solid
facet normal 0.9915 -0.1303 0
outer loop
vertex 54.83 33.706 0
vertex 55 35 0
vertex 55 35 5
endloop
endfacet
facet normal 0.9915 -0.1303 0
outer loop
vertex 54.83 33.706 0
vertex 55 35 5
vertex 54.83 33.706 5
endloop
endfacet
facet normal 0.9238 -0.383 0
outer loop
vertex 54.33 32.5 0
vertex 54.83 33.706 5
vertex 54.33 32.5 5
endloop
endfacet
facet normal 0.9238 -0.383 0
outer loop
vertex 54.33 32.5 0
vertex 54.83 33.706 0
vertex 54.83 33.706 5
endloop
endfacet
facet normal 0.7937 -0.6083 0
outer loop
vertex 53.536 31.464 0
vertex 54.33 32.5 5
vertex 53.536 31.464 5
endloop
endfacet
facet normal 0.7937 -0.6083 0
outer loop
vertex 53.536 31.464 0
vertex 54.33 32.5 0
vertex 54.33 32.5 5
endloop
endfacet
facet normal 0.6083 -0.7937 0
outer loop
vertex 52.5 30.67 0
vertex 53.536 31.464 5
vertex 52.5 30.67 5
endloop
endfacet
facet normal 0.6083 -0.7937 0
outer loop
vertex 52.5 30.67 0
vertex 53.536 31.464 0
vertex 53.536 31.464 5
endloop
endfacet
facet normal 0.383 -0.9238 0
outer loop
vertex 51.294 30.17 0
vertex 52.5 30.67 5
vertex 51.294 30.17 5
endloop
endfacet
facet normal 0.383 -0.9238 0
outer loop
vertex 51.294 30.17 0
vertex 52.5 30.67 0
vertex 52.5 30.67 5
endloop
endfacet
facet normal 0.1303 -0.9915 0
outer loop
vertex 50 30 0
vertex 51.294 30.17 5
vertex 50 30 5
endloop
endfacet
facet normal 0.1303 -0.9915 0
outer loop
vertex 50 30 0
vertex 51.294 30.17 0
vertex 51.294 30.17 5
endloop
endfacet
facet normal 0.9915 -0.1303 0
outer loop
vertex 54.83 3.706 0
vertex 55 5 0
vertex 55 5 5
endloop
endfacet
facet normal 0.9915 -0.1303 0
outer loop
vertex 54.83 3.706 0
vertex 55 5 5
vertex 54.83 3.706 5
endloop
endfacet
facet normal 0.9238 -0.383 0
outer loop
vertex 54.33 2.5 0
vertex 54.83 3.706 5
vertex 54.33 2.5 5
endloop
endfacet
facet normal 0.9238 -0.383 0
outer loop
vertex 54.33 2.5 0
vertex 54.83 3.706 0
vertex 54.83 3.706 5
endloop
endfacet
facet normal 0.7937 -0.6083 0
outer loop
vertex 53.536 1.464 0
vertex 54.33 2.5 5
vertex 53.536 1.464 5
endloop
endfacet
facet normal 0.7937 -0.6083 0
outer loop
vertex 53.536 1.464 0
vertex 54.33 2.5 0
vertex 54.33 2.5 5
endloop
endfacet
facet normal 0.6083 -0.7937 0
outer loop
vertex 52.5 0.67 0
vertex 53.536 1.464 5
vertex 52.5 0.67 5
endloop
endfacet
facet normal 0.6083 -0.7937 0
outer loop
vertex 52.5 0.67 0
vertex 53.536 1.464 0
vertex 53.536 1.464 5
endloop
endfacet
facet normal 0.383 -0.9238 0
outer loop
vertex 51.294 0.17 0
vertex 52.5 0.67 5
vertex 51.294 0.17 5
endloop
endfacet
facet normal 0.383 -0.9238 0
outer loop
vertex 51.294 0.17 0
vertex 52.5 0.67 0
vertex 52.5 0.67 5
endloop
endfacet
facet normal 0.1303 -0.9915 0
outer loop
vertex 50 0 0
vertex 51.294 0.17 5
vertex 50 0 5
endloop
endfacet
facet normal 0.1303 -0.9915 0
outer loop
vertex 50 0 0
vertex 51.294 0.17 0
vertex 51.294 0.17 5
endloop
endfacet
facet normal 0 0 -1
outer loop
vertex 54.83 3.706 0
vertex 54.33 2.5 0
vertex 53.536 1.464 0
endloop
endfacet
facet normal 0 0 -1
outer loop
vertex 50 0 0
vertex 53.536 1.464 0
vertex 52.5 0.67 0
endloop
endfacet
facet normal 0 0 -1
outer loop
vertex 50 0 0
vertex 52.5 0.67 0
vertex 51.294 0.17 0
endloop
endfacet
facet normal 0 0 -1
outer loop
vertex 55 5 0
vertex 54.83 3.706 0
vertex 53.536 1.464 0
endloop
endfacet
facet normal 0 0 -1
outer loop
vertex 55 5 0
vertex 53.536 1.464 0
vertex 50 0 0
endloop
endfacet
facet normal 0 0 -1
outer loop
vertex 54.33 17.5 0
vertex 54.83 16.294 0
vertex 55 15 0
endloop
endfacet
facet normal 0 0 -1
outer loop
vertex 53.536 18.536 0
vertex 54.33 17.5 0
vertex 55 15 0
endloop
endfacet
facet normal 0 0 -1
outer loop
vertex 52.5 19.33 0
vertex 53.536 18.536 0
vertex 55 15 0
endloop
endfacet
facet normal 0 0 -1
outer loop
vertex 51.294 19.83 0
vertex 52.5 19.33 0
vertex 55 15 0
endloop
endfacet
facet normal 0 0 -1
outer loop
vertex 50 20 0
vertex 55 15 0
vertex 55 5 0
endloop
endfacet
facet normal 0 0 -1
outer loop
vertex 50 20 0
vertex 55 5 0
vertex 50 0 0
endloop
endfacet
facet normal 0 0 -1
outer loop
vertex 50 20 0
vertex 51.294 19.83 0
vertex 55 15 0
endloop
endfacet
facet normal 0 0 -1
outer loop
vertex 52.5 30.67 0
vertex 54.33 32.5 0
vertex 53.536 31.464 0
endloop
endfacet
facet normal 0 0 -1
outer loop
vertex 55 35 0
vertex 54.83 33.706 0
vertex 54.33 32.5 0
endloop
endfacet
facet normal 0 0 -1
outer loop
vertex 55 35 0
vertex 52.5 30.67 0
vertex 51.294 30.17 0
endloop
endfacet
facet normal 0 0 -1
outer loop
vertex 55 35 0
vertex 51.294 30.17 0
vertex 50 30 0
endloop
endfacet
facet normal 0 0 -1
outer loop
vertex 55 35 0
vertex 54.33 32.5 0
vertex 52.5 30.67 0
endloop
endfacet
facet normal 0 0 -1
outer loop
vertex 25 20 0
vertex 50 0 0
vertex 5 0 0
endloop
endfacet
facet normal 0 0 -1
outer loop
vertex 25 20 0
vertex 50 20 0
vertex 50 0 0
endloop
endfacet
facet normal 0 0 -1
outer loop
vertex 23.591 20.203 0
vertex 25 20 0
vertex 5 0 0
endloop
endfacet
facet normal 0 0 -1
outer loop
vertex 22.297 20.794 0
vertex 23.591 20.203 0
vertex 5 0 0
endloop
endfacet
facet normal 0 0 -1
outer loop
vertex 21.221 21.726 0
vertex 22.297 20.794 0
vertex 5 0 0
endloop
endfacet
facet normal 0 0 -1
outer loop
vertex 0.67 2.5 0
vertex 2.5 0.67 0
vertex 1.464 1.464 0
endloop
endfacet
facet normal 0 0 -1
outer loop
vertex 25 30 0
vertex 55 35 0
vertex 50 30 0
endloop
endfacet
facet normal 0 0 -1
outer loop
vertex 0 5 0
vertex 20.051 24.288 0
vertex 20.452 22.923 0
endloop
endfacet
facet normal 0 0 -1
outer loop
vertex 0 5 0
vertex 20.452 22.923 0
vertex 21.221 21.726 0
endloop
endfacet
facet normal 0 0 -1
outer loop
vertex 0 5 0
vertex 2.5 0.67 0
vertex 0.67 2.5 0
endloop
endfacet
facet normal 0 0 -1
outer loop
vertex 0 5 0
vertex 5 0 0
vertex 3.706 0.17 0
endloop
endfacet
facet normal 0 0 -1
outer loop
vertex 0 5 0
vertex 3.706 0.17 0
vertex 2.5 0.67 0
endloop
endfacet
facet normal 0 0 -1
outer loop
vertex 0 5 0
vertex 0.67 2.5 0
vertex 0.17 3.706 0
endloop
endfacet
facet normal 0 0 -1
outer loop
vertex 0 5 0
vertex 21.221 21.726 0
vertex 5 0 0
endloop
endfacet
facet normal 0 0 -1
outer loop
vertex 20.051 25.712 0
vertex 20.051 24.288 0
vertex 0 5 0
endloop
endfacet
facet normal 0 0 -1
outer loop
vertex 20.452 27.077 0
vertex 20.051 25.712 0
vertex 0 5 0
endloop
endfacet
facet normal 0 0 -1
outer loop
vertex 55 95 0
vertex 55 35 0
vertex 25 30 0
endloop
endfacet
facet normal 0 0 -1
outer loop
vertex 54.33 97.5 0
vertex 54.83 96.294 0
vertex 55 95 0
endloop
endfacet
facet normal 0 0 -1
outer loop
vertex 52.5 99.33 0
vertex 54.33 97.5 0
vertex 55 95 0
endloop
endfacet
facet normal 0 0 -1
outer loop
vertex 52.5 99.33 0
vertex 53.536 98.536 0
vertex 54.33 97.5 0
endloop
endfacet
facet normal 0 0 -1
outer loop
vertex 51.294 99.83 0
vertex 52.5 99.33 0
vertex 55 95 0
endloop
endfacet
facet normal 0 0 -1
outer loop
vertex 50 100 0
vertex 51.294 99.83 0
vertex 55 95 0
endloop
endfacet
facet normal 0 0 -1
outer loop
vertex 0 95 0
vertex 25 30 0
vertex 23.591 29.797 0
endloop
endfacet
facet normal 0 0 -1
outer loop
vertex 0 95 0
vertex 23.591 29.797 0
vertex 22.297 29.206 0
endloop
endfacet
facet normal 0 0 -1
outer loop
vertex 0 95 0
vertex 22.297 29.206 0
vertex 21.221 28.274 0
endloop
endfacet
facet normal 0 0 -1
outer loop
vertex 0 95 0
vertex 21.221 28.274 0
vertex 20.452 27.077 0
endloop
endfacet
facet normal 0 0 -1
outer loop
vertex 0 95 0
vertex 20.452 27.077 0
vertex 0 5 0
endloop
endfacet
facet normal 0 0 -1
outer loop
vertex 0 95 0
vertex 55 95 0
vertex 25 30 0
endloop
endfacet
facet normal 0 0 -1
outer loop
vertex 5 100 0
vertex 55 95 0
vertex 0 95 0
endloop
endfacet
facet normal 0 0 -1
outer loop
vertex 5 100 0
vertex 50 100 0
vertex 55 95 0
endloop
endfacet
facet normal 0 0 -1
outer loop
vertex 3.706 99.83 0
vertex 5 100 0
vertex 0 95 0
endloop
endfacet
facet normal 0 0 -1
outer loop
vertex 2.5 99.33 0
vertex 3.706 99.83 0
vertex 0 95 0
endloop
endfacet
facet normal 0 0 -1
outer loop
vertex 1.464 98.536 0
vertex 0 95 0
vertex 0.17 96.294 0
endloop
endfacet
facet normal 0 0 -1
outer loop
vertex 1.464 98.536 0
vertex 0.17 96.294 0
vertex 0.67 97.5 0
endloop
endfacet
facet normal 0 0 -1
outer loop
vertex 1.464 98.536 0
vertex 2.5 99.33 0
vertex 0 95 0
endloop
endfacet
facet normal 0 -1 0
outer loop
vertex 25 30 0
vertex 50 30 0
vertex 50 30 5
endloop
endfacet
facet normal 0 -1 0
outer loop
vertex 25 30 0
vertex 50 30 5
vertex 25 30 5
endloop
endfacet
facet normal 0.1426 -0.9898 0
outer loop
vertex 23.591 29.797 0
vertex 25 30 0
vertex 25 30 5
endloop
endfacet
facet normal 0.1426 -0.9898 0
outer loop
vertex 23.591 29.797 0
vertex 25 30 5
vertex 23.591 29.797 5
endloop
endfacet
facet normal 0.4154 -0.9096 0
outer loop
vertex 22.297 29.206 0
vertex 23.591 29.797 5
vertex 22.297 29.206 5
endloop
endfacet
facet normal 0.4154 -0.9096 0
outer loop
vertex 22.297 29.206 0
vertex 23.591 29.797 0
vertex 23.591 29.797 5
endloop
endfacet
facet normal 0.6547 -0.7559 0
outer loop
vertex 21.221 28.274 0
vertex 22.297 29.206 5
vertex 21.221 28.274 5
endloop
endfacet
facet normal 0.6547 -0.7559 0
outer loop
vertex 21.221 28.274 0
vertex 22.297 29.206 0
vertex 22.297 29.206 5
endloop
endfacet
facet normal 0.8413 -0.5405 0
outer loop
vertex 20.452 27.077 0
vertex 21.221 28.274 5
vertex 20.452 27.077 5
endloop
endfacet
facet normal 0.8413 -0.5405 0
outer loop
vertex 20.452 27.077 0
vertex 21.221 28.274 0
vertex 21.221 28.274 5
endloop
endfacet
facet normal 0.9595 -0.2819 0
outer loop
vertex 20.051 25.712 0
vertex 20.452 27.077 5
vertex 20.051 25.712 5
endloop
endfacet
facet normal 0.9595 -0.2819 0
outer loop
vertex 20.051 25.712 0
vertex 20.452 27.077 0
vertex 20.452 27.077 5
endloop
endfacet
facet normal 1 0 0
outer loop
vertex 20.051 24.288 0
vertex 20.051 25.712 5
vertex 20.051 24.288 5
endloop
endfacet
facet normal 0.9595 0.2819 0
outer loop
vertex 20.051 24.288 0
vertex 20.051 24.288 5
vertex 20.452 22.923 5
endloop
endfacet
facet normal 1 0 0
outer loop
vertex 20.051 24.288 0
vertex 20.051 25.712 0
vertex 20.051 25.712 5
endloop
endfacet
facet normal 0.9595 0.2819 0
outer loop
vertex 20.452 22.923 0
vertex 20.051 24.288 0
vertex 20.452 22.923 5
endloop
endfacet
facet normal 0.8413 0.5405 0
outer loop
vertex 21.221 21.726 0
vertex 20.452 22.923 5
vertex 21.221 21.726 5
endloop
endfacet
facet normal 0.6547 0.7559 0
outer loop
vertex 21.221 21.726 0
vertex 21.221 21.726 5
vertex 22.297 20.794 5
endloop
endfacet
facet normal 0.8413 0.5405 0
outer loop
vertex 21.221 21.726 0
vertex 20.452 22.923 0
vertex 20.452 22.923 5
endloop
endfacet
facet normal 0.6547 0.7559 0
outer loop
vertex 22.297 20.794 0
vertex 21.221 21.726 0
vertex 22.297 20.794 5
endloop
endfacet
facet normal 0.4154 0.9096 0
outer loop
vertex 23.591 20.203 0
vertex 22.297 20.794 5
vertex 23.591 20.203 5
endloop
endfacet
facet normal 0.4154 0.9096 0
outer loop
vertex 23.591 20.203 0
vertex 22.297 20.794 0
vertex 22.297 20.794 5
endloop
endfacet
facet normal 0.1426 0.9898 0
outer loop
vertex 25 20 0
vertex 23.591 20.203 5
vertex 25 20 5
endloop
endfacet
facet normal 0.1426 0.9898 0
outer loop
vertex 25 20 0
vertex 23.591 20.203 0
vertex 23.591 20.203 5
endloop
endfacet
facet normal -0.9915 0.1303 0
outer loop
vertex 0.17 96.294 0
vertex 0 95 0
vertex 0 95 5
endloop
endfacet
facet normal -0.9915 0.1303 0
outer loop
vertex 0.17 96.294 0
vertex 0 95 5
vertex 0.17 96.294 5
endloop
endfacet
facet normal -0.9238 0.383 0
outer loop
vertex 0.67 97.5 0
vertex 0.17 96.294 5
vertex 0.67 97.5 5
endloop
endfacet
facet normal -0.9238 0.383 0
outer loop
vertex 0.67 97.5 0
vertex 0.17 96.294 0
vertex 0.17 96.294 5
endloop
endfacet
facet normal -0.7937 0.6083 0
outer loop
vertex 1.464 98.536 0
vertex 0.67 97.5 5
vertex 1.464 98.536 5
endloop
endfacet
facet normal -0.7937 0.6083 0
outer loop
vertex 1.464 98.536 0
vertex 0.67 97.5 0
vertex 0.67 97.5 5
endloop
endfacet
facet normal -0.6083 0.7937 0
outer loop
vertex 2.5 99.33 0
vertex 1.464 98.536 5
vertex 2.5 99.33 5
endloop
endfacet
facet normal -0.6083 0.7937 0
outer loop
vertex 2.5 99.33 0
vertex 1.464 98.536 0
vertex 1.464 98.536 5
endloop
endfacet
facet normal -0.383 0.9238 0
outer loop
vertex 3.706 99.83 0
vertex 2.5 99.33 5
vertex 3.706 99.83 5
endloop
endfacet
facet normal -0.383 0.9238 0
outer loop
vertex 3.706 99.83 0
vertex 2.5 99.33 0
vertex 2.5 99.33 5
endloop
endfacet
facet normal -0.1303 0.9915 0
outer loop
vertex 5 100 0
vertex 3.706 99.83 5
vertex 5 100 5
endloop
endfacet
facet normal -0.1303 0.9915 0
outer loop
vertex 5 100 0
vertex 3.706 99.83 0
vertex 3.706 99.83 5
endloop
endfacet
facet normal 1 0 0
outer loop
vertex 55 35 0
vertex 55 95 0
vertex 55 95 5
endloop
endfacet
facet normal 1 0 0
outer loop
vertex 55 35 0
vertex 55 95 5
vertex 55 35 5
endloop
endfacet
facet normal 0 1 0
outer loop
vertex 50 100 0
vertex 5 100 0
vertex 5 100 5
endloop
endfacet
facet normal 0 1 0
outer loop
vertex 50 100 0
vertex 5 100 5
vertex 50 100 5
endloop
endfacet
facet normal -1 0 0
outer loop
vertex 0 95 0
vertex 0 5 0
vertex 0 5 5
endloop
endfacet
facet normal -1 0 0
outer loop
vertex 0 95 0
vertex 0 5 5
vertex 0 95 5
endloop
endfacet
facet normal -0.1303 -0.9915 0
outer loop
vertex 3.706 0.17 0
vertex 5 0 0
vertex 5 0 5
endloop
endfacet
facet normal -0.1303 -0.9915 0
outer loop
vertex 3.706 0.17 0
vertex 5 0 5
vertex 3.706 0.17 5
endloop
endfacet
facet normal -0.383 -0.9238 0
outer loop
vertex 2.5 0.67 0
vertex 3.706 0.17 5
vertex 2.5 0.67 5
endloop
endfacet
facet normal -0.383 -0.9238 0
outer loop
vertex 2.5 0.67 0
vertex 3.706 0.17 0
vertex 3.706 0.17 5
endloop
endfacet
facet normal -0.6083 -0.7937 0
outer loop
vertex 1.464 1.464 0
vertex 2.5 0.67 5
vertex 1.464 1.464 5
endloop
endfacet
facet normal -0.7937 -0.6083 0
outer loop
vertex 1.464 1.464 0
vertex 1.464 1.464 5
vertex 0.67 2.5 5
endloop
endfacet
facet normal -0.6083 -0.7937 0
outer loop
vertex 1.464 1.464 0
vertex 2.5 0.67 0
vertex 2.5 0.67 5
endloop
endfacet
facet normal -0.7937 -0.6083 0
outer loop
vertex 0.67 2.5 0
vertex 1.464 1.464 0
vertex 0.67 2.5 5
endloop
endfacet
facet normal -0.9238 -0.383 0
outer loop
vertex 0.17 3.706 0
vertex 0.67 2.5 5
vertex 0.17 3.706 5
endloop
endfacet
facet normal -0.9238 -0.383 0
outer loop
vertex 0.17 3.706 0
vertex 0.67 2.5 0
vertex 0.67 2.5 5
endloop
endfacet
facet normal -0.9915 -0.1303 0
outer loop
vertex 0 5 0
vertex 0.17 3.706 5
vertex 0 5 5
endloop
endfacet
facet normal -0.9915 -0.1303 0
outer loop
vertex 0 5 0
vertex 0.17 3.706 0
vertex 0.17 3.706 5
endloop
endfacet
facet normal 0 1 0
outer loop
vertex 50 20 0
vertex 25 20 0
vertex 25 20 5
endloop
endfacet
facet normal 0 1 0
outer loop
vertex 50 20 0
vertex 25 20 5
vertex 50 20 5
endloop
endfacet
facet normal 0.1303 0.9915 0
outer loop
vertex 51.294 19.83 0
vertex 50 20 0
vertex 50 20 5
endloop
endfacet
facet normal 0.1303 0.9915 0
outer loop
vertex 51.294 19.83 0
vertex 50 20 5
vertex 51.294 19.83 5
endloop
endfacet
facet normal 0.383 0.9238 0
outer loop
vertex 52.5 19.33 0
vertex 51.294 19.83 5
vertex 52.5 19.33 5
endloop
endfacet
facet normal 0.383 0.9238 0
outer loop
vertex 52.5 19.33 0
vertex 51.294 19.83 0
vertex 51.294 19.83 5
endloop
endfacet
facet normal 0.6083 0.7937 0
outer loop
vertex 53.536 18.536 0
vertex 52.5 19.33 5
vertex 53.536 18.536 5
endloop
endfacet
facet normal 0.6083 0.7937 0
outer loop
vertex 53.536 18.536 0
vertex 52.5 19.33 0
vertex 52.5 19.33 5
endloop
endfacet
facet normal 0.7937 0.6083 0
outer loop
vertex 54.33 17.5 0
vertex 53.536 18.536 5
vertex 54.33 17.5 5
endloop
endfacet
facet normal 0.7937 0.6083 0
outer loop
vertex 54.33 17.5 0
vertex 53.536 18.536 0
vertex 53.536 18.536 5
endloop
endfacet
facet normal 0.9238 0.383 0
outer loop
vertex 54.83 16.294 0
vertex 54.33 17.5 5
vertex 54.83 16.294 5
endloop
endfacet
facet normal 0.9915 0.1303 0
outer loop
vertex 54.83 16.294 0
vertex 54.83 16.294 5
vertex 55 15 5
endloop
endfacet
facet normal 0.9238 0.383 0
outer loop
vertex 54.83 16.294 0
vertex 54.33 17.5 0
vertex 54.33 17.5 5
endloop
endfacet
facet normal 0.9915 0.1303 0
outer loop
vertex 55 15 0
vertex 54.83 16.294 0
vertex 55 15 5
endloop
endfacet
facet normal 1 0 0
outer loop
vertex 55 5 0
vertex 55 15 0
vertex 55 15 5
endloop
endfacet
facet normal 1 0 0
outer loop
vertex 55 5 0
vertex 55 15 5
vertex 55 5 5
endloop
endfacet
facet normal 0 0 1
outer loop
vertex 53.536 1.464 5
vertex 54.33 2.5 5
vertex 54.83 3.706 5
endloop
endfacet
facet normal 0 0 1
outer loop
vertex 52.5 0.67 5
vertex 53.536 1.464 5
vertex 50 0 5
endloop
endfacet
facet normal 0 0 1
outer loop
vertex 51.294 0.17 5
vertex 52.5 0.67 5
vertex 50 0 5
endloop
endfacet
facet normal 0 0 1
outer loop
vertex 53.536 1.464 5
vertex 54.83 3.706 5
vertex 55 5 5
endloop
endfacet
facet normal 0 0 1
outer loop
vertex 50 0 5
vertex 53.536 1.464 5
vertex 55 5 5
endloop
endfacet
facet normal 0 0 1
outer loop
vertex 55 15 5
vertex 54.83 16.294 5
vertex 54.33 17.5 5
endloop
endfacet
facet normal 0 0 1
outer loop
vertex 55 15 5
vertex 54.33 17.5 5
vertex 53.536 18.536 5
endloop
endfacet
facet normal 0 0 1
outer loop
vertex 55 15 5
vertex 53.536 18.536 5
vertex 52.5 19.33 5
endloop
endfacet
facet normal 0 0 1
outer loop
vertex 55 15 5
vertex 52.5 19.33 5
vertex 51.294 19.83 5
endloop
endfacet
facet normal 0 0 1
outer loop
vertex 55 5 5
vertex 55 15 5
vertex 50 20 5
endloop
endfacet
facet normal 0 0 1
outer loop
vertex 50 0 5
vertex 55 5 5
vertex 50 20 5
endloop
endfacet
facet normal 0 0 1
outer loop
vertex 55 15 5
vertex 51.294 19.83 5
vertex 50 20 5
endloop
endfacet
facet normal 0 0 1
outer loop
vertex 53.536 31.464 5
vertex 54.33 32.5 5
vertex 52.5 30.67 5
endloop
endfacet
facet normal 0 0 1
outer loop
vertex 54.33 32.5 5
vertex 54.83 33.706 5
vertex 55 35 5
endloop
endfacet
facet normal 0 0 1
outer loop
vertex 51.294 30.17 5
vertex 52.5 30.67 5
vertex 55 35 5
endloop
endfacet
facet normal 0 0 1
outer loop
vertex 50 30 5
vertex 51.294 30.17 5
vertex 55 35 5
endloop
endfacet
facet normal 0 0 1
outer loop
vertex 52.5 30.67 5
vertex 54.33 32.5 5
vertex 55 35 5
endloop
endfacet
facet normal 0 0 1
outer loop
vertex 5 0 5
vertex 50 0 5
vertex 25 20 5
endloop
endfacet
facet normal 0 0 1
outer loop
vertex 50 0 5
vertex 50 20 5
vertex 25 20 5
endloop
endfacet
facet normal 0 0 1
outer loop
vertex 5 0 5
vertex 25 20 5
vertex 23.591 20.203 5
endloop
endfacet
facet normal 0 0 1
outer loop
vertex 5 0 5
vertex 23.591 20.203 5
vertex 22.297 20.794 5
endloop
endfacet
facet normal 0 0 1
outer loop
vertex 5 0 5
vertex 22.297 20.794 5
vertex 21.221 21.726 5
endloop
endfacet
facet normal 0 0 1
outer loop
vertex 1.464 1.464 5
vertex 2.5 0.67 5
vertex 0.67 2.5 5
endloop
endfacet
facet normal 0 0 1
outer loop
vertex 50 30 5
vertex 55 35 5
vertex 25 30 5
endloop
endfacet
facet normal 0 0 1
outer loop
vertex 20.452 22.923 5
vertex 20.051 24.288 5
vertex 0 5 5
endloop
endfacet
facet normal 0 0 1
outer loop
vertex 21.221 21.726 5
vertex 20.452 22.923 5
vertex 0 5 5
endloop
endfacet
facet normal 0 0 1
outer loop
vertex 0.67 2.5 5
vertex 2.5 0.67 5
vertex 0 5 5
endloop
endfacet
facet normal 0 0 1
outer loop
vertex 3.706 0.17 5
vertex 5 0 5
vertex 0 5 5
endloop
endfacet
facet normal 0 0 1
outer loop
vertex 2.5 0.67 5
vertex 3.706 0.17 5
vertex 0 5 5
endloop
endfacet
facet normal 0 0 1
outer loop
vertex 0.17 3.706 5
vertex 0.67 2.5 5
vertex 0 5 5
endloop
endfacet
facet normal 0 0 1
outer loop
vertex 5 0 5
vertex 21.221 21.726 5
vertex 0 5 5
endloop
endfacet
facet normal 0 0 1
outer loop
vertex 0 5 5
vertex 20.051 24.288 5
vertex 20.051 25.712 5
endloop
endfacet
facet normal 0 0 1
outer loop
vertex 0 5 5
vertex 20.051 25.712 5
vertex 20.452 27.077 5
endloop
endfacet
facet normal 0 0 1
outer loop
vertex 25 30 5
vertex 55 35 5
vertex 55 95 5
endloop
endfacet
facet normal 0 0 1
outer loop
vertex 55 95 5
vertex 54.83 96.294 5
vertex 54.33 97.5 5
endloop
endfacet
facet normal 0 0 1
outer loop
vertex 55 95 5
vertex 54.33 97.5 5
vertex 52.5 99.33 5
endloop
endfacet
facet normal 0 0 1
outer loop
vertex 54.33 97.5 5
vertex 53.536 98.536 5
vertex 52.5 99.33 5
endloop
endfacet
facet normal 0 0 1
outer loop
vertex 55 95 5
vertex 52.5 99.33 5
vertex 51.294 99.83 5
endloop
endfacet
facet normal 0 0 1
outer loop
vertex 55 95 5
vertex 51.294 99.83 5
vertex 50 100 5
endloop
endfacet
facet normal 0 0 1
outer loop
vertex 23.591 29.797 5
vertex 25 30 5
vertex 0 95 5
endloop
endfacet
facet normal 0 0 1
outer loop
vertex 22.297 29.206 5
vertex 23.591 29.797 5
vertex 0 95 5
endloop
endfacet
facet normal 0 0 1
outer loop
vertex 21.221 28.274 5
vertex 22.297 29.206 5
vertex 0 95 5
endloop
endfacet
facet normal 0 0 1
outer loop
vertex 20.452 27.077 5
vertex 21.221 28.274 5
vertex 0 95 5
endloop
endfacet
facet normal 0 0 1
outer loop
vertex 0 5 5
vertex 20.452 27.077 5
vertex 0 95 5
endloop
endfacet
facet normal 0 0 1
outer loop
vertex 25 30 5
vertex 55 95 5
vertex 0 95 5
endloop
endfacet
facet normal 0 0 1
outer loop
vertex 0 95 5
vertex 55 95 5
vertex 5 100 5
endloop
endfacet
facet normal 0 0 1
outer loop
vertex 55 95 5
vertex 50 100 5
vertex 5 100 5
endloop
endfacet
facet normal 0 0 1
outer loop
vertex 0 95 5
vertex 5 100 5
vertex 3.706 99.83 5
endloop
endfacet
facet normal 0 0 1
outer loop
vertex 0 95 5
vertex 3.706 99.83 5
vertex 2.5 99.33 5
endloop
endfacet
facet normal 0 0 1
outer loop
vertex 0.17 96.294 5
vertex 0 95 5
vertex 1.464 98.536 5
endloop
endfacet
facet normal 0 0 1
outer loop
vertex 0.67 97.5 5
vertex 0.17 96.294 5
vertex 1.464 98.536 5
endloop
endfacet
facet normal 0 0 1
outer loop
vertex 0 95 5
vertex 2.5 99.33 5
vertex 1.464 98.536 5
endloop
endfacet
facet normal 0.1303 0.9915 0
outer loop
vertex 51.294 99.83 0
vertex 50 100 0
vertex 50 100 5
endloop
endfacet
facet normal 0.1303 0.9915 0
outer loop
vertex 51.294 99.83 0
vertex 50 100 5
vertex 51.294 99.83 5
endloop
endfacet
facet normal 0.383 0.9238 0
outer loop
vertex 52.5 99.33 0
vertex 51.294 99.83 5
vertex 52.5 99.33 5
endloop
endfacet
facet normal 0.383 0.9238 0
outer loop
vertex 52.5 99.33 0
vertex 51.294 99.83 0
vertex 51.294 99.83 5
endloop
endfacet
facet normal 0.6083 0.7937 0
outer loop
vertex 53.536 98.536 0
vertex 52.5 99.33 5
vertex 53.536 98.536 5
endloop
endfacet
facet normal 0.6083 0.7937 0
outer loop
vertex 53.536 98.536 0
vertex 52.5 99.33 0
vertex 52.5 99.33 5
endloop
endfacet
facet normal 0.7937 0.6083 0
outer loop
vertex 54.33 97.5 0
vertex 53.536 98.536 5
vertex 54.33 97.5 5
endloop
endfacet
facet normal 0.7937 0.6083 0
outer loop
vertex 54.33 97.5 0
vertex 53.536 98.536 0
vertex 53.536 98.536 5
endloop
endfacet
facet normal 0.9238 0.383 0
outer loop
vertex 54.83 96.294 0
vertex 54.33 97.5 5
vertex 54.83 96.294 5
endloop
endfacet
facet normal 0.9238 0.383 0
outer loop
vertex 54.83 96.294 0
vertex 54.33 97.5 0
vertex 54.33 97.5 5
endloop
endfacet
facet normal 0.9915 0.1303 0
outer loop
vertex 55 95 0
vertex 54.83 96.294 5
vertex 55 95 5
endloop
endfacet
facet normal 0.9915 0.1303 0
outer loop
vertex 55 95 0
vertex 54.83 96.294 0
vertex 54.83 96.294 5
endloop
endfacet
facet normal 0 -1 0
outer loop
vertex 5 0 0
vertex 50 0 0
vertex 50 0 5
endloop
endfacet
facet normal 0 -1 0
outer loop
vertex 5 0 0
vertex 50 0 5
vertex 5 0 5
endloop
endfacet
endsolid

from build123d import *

# Parameters (mm, degrees)
BOSS_EXTRU_1_DEPTH = 5


with BuildPart() as part:
    # Esquisse1 → Boss.-Extru.1 (new body)
    with BuildSketch(Plane.XY):
        with BuildLine():
            Line((55, 95), (55, 35))
            ThreePointArc((55, 35), (53.535533906, 31.464466094), (50, 30))
            Line((50, 30), (25, 30))
            ThreePointArc((25, 30), (20, 25), (25, 20))
            Line((25, 20), (50, 20))
            ThreePointArc((50, 20), (53.535533906, 18.535533906), (55, 15))
            Line((55, 15), (55, 5))
            ThreePointArc((55, 5), (53.535533906, 1.464466094), (50, 0))
            Line((50, 0), (5, 0))
            ThreePointArc((5, 0), (1.464466094, 1.464466094), (0, 5))
            Line((0, 5), (0, 95))
            ThreePointArc((0, 95), (1.464466094, 98.535533906), (5, 100))
            Line((5, 100), (50, 100))
            ThreePointArc((50, 100), (53.535533906, 98.535533906), (55, 95))
        make_face()
    extrude(amount=BOSS_EXTRU_1_DEPTH)


solid = part.part
